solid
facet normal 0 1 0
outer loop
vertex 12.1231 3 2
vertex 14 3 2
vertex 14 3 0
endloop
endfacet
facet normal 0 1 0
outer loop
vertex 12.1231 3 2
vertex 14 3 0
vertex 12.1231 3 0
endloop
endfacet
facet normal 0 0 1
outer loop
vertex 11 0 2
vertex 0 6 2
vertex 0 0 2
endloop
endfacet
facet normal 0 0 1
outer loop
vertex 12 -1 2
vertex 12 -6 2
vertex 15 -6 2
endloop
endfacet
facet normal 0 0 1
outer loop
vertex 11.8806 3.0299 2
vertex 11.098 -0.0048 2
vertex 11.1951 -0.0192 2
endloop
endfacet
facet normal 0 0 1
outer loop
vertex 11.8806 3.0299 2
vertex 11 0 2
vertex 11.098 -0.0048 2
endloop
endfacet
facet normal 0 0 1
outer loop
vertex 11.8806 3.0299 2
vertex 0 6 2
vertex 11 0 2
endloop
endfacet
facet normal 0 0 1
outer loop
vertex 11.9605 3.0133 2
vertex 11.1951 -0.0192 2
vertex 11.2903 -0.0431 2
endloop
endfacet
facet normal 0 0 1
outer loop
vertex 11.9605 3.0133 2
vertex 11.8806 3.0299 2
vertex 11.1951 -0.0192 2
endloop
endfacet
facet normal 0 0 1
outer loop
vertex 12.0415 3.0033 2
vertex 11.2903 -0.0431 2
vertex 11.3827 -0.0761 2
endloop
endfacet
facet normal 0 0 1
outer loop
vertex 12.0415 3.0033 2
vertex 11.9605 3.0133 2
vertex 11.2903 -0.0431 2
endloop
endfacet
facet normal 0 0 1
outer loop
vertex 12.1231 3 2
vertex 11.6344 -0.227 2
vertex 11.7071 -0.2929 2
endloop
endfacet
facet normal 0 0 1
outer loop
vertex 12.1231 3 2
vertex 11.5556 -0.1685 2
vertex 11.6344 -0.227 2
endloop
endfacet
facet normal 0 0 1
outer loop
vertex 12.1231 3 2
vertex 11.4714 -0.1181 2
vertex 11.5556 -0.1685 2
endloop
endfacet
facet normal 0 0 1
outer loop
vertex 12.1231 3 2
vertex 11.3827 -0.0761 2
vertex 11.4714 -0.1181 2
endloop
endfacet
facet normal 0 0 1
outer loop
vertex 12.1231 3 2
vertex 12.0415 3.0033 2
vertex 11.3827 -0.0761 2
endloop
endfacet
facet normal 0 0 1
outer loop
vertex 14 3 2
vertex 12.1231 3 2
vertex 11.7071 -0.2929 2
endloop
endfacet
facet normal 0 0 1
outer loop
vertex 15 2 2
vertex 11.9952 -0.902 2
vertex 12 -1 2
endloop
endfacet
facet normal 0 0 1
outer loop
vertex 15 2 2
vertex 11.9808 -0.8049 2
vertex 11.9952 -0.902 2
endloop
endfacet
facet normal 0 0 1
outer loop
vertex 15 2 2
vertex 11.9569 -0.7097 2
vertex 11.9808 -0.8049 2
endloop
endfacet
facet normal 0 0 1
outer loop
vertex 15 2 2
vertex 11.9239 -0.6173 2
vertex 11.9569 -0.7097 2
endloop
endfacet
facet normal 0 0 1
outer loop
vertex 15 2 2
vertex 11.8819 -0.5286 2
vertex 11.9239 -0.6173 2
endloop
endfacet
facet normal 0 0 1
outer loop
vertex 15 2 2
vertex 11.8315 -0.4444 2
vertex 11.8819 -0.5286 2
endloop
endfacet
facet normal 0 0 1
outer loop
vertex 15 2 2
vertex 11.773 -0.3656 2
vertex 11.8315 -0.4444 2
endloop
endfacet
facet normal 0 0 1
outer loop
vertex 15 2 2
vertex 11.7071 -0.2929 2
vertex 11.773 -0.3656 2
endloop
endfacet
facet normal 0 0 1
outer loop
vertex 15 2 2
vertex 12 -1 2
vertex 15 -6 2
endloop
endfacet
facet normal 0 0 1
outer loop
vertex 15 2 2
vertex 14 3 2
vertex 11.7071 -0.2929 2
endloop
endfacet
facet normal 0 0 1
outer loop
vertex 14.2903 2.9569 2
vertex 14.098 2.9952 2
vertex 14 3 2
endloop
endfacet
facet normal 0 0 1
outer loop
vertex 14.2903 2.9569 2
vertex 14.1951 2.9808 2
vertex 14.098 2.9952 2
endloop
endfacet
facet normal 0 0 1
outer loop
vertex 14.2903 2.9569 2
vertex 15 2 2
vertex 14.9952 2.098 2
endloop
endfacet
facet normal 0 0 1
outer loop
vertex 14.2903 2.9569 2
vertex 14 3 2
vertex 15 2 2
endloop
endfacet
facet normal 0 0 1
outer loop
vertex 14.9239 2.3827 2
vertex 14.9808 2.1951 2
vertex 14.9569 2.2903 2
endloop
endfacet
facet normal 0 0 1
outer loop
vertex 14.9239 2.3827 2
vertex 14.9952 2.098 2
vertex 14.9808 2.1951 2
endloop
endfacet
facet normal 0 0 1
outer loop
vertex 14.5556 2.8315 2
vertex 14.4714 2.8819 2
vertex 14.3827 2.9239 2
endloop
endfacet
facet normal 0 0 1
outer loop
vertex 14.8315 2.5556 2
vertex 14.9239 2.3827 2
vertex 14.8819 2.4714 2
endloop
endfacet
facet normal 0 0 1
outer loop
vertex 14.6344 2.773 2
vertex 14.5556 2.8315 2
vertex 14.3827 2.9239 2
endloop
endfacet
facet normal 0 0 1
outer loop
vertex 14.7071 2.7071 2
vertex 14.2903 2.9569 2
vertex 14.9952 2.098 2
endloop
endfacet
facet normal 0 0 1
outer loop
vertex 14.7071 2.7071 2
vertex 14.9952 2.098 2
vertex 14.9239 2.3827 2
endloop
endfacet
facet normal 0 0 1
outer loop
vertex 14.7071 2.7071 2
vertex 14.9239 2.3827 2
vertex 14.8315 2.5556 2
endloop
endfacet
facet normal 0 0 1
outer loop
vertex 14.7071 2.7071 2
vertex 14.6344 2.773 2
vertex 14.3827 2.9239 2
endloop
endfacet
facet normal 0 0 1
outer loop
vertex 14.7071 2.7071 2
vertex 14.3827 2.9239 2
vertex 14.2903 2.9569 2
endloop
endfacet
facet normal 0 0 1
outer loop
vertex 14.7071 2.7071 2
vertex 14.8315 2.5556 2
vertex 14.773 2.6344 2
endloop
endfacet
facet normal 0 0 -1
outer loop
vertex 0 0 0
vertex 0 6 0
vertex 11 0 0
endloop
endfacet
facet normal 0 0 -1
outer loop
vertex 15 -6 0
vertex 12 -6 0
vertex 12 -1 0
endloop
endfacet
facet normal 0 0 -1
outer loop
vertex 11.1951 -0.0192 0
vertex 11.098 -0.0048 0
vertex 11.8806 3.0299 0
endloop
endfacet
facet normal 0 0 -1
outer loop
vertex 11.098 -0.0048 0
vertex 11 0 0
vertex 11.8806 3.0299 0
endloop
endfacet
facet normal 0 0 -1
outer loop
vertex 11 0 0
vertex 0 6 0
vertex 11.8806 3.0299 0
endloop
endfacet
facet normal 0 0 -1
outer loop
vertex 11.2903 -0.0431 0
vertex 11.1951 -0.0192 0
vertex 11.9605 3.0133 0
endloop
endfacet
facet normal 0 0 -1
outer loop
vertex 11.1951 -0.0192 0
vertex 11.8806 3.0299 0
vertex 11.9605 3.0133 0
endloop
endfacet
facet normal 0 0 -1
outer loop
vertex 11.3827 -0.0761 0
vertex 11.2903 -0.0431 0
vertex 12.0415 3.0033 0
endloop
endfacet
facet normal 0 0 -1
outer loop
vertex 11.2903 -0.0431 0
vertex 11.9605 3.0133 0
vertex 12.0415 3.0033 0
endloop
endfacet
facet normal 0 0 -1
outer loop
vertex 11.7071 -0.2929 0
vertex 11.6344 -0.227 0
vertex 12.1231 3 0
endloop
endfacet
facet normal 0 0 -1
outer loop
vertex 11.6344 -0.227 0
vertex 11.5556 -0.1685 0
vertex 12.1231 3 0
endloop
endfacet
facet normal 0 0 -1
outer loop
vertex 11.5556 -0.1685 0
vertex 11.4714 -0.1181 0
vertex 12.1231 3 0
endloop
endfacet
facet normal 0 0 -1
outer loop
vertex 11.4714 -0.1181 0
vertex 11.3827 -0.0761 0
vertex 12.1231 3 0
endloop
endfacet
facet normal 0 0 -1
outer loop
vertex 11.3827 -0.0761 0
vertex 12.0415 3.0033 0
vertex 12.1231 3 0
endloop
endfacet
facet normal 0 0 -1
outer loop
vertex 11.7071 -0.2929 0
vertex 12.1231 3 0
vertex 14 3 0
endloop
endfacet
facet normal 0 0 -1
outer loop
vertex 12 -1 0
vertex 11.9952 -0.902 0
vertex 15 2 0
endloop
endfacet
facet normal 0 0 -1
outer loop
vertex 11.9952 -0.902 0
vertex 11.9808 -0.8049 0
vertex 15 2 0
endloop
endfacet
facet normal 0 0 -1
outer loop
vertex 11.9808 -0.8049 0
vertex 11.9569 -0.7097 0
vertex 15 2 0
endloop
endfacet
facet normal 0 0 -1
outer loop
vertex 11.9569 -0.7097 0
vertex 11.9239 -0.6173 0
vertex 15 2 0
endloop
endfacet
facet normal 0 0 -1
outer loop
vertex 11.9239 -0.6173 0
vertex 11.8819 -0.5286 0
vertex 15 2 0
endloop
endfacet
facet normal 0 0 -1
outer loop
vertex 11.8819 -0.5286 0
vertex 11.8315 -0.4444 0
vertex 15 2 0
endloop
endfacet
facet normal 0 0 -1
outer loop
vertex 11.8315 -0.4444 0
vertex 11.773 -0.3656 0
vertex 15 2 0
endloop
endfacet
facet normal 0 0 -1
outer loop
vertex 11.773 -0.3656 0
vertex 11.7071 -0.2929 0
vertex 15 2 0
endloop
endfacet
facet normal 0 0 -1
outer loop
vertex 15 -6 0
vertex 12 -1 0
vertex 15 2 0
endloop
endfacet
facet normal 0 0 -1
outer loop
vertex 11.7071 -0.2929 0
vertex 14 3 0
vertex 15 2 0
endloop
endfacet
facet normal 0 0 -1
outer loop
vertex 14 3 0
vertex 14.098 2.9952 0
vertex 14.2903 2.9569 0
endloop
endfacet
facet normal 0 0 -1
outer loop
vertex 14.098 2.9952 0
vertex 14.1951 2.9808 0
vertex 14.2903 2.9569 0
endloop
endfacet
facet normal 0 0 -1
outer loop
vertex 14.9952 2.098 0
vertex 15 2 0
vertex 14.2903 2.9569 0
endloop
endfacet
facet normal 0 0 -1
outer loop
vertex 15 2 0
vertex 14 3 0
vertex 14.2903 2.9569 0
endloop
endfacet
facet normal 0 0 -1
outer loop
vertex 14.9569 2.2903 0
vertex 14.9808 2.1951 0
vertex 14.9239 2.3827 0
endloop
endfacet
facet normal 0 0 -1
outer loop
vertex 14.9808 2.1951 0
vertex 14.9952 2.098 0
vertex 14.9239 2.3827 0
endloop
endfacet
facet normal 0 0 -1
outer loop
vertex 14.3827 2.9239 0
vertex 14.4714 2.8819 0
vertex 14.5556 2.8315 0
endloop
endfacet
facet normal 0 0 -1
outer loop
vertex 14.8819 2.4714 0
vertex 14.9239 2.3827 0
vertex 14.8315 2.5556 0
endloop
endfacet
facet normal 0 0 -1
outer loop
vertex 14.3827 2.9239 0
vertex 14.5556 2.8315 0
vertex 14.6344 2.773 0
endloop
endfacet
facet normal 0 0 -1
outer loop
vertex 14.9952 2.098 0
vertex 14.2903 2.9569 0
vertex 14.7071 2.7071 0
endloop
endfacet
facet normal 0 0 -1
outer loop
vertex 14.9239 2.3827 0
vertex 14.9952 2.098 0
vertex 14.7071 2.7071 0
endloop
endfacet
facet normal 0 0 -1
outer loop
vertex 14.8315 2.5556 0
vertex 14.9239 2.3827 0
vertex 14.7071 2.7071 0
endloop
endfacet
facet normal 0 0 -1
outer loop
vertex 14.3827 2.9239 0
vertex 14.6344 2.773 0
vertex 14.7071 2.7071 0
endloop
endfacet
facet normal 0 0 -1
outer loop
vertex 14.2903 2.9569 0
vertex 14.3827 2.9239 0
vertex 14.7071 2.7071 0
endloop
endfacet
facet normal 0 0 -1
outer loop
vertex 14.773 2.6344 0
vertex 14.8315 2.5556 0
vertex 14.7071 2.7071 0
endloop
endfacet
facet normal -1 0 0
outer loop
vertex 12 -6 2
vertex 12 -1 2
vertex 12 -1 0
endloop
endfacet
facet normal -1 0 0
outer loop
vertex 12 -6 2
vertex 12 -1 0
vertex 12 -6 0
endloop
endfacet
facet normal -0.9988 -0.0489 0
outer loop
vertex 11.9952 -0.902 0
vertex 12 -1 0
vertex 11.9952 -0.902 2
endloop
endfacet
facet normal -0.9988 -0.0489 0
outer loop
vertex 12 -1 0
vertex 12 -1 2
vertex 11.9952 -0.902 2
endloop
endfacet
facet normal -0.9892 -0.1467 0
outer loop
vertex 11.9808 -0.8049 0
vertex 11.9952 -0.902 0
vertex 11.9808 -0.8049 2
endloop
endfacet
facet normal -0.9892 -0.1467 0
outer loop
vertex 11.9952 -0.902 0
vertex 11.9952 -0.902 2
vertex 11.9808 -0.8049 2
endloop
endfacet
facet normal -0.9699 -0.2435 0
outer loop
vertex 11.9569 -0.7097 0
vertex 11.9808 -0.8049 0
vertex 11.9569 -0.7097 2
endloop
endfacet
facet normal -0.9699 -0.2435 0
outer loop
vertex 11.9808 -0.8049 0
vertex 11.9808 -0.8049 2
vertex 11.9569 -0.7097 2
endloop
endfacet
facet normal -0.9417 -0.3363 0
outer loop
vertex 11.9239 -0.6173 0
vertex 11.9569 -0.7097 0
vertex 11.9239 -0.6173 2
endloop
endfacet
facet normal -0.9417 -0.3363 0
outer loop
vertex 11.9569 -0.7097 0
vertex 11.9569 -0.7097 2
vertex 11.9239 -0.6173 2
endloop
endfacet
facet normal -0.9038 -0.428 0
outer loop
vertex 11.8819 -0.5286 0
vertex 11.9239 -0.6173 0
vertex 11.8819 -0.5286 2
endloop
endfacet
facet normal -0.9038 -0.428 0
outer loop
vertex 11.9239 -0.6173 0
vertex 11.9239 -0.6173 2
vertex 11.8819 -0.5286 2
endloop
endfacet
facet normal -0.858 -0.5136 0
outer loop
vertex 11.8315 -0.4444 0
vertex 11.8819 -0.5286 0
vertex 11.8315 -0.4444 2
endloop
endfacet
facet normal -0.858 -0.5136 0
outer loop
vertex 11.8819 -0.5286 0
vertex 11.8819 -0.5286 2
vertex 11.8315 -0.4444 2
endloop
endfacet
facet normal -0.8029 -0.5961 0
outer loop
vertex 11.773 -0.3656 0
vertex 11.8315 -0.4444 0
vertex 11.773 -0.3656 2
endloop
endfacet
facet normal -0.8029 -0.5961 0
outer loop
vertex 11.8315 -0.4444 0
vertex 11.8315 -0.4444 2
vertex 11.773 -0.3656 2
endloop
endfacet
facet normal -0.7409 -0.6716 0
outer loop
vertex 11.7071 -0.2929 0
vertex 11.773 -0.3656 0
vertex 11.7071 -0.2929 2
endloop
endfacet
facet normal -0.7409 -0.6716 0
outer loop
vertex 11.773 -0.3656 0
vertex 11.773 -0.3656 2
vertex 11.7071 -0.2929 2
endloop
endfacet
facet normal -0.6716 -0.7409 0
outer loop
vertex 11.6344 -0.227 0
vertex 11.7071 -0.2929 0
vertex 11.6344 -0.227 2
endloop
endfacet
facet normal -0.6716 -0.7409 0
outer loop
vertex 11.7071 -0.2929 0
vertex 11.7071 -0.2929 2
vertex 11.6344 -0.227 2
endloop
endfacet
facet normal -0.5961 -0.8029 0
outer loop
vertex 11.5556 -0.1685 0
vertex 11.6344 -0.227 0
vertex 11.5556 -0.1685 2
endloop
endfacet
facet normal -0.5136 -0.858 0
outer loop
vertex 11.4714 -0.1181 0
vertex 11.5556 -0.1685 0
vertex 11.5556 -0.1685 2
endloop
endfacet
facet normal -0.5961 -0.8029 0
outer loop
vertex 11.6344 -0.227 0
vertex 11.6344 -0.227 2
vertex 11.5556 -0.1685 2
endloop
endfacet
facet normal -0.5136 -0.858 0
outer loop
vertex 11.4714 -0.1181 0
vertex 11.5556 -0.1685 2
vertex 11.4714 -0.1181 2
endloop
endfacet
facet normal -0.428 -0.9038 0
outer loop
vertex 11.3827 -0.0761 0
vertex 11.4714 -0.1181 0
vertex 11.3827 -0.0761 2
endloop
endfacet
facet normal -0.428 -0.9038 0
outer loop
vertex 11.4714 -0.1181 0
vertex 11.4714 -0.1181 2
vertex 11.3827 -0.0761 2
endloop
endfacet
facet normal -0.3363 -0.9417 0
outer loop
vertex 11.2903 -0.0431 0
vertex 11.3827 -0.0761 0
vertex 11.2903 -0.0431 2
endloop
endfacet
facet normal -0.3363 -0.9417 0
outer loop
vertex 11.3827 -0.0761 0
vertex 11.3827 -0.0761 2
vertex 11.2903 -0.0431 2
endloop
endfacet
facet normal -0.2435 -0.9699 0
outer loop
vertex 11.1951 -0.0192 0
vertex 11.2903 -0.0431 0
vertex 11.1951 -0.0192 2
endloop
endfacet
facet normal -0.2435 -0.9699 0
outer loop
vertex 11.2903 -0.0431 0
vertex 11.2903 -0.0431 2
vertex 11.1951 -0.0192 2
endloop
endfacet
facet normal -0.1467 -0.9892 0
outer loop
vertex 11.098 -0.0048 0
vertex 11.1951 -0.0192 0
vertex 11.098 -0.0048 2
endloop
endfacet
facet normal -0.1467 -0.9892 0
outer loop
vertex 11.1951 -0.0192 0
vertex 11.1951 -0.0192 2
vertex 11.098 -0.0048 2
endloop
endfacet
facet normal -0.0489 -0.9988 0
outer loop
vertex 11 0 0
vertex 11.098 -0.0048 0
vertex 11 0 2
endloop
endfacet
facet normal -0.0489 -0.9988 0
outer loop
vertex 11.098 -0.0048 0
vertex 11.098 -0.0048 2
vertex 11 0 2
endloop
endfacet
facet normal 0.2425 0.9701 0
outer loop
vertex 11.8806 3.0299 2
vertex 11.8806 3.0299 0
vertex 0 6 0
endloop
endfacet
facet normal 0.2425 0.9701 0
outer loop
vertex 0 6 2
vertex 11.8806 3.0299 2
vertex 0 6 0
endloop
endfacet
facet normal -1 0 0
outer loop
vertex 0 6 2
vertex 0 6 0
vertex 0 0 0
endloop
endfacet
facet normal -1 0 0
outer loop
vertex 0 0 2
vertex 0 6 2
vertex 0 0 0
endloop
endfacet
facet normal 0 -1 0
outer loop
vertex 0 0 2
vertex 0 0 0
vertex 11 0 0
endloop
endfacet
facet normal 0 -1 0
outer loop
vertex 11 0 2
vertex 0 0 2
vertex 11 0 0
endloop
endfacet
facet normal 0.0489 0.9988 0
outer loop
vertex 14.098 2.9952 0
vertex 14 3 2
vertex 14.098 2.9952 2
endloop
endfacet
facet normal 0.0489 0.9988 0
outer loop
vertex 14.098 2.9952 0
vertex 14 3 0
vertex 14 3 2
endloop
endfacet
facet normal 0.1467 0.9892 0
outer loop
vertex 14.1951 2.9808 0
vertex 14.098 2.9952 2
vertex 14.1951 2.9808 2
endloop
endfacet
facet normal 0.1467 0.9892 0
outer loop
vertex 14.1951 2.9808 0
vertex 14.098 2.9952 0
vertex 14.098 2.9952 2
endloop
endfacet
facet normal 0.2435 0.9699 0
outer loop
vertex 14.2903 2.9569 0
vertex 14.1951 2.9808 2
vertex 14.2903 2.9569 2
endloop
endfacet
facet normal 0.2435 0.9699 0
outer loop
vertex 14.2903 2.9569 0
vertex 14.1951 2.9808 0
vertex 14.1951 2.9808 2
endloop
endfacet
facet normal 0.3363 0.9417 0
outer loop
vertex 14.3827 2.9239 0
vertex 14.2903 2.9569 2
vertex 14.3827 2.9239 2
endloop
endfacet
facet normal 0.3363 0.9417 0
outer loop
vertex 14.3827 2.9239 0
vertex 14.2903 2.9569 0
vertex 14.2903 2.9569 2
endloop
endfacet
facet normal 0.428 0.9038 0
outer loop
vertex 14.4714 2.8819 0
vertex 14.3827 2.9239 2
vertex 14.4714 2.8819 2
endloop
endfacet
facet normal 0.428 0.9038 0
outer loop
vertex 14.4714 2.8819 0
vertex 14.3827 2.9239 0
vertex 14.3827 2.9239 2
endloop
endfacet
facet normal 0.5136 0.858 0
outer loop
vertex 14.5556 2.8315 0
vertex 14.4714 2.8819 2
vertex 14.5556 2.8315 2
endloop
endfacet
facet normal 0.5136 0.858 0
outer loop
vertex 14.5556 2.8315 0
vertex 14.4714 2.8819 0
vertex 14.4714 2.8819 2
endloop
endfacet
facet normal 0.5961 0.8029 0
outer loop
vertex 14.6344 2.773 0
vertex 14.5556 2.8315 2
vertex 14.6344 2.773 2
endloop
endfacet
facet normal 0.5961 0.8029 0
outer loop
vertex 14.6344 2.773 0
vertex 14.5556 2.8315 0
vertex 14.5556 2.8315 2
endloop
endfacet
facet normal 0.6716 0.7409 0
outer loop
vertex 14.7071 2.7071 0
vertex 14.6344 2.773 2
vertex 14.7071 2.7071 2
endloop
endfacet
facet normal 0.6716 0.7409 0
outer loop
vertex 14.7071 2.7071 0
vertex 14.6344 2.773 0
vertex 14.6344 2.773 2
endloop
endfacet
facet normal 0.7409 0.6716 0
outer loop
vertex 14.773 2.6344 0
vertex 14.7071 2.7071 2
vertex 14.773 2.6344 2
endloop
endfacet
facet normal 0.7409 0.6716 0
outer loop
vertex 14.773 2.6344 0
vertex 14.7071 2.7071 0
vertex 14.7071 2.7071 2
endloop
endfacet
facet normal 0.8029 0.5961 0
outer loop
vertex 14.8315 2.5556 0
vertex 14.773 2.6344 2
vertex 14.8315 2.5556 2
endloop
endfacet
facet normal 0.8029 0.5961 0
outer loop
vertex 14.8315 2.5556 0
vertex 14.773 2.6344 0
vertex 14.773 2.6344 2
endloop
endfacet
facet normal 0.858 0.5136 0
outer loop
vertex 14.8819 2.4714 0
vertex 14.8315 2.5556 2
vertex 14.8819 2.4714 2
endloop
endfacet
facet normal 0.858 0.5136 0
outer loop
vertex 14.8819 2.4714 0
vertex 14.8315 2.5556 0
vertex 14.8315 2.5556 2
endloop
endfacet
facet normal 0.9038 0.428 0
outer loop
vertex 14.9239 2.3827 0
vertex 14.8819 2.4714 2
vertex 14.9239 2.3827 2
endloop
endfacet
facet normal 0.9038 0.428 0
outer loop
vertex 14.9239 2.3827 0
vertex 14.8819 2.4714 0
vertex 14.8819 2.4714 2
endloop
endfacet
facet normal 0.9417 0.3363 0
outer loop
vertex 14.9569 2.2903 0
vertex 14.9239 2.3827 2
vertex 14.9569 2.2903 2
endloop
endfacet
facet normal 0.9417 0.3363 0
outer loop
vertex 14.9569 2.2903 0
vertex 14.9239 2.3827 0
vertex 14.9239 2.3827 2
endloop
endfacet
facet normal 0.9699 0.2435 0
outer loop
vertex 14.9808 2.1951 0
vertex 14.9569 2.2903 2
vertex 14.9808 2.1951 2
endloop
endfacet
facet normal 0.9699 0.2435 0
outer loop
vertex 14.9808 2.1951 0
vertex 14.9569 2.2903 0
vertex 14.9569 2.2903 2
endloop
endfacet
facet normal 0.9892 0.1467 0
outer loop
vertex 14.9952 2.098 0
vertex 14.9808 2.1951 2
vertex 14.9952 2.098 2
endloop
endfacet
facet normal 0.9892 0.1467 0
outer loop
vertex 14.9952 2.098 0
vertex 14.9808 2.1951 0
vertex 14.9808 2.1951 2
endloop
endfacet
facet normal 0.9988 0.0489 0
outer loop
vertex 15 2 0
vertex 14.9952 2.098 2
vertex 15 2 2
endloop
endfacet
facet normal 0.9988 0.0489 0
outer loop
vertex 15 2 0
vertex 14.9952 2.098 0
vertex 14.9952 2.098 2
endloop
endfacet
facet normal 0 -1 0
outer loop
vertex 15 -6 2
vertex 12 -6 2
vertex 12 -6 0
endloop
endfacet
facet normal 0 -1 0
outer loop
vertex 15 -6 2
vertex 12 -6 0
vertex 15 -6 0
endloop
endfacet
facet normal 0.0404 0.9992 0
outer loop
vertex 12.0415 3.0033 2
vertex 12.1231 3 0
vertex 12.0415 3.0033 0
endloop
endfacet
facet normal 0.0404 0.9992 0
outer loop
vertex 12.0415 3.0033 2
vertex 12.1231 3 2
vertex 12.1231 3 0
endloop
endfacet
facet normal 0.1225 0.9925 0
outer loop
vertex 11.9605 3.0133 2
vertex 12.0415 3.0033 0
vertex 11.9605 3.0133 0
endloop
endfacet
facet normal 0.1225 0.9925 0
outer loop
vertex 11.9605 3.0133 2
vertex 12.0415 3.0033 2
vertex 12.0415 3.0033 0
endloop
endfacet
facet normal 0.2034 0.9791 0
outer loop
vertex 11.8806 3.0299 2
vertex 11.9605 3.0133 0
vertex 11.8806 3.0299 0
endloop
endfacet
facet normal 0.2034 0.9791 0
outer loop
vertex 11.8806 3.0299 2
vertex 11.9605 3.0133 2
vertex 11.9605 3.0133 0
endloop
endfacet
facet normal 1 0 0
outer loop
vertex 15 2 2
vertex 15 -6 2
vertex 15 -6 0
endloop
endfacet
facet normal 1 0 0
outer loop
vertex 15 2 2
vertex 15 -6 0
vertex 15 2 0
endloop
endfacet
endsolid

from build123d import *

# Parameters (mm, degrees)
F1_DEPTH = 2
F3_DEPTH = 2
F4_R     = 1


with BuildPart() as f1:
    # F0 (on Top) → F1 (new body)
    with BuildSketch(Plane.XY):
        Polygon((0, 3), (0, 0), (12, 0), (12, 3), (0, 6), align=None)
    extrude(amount=F1_DEPTH)

    # F2 (on face) → F3 (join, through all)
    with BuildSketch(Plane.XY.offset(2)):
        Polygon((15, 3), (12, 3), (12, 0), (12, -6), (15, -6), align=None)
    extrude(amount=-F3_DEPTH)

    # F4
    f4_edges = [f1.edges().sort_by_distance(p)[0] for p in [
        (12, 0, 1),
        (12, 3, 1),
        (15, 3, 1),
    ]]
    fillet(f4_edges, radius=F4_R)


solid = f1.part
